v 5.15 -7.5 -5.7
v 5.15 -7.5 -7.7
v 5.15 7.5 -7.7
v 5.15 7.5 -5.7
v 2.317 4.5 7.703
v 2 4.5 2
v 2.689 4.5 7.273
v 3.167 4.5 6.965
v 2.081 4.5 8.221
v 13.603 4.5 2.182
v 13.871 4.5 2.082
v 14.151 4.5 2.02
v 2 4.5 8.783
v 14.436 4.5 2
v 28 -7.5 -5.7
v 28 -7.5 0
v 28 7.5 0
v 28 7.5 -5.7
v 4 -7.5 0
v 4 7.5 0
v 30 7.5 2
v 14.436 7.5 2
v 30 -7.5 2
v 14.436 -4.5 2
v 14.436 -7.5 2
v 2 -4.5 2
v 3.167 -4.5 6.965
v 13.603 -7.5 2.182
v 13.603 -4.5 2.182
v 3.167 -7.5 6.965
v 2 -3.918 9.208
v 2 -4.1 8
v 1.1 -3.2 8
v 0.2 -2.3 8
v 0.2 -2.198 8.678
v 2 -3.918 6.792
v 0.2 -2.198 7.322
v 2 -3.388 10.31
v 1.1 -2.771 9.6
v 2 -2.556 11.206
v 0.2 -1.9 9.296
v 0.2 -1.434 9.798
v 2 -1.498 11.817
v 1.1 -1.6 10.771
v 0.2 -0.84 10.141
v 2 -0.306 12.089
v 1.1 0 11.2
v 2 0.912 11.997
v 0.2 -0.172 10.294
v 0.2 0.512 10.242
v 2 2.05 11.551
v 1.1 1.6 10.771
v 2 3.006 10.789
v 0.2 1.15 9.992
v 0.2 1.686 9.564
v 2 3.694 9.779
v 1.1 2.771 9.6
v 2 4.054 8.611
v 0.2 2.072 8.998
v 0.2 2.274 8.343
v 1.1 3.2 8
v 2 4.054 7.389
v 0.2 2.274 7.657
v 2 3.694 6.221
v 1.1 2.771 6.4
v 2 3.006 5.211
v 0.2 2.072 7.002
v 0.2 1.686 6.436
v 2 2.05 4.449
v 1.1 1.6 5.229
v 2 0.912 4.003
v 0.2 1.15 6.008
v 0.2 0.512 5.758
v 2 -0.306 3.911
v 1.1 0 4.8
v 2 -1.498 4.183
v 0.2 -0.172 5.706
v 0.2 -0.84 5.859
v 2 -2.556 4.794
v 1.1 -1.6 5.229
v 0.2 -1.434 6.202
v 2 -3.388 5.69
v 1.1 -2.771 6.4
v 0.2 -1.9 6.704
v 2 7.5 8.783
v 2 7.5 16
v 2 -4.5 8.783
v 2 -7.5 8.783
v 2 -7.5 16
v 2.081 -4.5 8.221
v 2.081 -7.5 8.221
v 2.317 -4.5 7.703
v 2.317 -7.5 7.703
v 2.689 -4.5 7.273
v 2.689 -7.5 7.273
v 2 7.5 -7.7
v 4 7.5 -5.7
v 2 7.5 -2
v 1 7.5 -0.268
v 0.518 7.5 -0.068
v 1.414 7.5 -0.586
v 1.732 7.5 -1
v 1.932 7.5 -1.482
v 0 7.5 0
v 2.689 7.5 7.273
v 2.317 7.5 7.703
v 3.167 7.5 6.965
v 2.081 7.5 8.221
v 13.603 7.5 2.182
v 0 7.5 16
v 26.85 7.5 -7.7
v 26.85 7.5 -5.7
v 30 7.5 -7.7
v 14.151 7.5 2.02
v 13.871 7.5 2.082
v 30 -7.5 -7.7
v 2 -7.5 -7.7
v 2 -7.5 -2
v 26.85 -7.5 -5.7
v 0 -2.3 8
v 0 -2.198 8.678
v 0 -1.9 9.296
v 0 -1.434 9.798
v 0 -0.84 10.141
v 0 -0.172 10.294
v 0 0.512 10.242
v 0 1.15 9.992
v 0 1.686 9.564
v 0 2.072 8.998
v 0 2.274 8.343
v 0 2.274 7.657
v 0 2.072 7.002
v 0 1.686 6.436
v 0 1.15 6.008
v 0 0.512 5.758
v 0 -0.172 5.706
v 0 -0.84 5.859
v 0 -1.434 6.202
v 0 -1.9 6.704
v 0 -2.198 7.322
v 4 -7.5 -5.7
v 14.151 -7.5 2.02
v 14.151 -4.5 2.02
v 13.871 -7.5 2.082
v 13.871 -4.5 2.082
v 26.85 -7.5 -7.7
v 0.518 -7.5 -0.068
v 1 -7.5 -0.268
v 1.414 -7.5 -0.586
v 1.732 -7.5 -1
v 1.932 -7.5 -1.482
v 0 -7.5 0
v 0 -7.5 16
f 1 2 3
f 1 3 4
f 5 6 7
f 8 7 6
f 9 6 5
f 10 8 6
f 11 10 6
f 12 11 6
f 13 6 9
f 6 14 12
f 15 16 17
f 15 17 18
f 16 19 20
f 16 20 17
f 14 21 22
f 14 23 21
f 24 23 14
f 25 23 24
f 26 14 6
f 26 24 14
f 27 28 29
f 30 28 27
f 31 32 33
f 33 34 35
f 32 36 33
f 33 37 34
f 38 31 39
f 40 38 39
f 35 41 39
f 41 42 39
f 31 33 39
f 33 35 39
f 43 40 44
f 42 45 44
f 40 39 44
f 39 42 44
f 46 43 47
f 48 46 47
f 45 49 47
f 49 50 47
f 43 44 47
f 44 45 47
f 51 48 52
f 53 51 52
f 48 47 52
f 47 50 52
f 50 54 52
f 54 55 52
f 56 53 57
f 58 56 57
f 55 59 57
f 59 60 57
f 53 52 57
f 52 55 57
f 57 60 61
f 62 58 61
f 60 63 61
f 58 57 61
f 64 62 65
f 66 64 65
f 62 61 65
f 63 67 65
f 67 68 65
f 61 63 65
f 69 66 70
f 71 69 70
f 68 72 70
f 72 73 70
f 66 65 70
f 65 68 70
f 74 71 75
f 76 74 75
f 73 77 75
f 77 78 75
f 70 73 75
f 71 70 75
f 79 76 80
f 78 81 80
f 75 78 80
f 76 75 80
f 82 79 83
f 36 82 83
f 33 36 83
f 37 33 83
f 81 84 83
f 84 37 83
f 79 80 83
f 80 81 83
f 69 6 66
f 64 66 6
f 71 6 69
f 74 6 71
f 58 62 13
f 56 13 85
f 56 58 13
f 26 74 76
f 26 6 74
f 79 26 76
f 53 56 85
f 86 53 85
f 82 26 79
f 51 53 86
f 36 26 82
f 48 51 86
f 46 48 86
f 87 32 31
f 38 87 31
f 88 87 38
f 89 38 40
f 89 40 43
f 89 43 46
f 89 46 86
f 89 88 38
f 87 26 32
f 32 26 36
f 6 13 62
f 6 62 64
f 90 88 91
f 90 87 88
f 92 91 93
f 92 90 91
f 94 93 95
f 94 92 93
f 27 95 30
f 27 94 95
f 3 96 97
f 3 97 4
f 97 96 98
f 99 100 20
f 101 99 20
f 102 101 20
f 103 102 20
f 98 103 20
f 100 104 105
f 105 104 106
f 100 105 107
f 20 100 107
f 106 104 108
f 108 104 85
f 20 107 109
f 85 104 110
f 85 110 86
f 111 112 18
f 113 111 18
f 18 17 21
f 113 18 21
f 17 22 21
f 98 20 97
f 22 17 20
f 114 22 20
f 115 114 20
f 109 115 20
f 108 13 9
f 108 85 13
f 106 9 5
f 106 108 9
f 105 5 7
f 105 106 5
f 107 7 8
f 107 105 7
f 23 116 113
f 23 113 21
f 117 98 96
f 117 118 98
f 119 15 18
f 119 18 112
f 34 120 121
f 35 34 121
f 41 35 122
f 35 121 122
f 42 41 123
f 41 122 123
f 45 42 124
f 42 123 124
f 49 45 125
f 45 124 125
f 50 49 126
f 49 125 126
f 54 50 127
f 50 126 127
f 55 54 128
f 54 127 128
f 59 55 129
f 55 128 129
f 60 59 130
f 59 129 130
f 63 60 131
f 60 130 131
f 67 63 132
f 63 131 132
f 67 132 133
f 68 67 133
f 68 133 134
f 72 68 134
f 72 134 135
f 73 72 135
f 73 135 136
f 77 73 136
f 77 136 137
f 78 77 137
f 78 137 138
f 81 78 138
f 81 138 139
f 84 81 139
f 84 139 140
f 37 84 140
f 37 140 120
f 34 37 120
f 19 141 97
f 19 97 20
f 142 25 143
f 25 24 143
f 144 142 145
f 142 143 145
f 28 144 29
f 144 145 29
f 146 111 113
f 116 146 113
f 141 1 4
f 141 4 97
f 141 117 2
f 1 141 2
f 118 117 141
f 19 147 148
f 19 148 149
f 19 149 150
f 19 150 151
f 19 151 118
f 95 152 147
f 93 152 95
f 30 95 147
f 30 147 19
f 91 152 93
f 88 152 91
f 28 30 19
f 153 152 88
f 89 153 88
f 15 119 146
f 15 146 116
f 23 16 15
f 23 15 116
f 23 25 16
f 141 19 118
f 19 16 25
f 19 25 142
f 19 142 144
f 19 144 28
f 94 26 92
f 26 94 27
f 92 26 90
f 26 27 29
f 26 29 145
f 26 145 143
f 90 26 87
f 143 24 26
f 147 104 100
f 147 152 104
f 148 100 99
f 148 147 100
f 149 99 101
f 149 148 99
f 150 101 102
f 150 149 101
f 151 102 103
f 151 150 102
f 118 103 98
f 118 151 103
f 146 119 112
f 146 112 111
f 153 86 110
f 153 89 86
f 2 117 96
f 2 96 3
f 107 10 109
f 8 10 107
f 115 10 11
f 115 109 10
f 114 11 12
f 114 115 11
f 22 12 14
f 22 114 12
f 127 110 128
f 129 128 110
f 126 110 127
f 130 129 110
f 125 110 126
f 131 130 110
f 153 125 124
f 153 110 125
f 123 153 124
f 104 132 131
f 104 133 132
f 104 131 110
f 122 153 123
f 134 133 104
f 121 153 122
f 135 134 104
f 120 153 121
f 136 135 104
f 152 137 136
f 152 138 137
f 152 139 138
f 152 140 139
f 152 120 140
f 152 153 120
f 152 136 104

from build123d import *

# Parameters (mm, degrees)
F1_DEPTH = 7.5
F2_DEPTH = 4.5
F3_R     = 2.3
F4_DEPTH = 5
F5_SIZE  = 1.8
F6_R     = 1.99999


# Not quite as in the source:
# - a fillet or chamfer is up to 0.001 mm smaller than in the source, because OpenCascade refuses the exact size


with BuildPart() as f1:
    # F0 (on Front) → F1 (new body, symmetric)
    with BuildSketch(Plane.XZ):
        Polygon((2, 16), (0, 16), (0, 0), (2, 0), (2, -7.7), (5.15, -7.7), (5.15, -5.7), (4, -5.7), (4, 0), (28, 0), (28, -5.7), (26.85, -5.7), (26.85, -7.7), (30, -7.7), (30, 2), (14, 2), (2, 2), (2, 7.5), align=None)
        Polygon((14, 2), (2, 7.5), (2, 2), align=None)
    extrude(amount=F1_DEPTH, both=True)

    # F0 (on Front) → F2 (cut, symmetric)
    with BuildSketch(Plane.XZ):
        Polygon((14, 2), (2, 7.5), (2, 2), align=None)
    extrude(amount=F2_DEPTH, both=True, mode=Mode.SUBTRACT)

    # F3 (on face) → F4 (cut)
    with BuildSketch(Plane(origin=(0, 0, 0), x_dir=(0, -1, 0), z_dir=(-1, 0, 0))):
        with Locations((0, 8)):
            Circle(F3_R)
    extrude(amount=-F4_DEPTH, mode=Mode.SUBTRACT)

    # F5
    f5_edges = [f1.edges().sort_by_distance(p)[0] for p in [
        (2, 2.3, 8),
    ]]
    chamfer(f5_edges, length=F5_SIZE)

    # F6 (radius 2 in the source; OpenCascade refuses exactly that, so slightly less here)
    f6_edges = [f1.edges().sort_by_distance(p)[0] for p in [
        (2, -6, 7.5),
        (14, 6, 2),
        (14, -6, 2),
        (2, 6, 7.5),
        (2, 0, 0),
    ]]
    fillet(f6_edges, radius=F6_R)


solid = f1.part
